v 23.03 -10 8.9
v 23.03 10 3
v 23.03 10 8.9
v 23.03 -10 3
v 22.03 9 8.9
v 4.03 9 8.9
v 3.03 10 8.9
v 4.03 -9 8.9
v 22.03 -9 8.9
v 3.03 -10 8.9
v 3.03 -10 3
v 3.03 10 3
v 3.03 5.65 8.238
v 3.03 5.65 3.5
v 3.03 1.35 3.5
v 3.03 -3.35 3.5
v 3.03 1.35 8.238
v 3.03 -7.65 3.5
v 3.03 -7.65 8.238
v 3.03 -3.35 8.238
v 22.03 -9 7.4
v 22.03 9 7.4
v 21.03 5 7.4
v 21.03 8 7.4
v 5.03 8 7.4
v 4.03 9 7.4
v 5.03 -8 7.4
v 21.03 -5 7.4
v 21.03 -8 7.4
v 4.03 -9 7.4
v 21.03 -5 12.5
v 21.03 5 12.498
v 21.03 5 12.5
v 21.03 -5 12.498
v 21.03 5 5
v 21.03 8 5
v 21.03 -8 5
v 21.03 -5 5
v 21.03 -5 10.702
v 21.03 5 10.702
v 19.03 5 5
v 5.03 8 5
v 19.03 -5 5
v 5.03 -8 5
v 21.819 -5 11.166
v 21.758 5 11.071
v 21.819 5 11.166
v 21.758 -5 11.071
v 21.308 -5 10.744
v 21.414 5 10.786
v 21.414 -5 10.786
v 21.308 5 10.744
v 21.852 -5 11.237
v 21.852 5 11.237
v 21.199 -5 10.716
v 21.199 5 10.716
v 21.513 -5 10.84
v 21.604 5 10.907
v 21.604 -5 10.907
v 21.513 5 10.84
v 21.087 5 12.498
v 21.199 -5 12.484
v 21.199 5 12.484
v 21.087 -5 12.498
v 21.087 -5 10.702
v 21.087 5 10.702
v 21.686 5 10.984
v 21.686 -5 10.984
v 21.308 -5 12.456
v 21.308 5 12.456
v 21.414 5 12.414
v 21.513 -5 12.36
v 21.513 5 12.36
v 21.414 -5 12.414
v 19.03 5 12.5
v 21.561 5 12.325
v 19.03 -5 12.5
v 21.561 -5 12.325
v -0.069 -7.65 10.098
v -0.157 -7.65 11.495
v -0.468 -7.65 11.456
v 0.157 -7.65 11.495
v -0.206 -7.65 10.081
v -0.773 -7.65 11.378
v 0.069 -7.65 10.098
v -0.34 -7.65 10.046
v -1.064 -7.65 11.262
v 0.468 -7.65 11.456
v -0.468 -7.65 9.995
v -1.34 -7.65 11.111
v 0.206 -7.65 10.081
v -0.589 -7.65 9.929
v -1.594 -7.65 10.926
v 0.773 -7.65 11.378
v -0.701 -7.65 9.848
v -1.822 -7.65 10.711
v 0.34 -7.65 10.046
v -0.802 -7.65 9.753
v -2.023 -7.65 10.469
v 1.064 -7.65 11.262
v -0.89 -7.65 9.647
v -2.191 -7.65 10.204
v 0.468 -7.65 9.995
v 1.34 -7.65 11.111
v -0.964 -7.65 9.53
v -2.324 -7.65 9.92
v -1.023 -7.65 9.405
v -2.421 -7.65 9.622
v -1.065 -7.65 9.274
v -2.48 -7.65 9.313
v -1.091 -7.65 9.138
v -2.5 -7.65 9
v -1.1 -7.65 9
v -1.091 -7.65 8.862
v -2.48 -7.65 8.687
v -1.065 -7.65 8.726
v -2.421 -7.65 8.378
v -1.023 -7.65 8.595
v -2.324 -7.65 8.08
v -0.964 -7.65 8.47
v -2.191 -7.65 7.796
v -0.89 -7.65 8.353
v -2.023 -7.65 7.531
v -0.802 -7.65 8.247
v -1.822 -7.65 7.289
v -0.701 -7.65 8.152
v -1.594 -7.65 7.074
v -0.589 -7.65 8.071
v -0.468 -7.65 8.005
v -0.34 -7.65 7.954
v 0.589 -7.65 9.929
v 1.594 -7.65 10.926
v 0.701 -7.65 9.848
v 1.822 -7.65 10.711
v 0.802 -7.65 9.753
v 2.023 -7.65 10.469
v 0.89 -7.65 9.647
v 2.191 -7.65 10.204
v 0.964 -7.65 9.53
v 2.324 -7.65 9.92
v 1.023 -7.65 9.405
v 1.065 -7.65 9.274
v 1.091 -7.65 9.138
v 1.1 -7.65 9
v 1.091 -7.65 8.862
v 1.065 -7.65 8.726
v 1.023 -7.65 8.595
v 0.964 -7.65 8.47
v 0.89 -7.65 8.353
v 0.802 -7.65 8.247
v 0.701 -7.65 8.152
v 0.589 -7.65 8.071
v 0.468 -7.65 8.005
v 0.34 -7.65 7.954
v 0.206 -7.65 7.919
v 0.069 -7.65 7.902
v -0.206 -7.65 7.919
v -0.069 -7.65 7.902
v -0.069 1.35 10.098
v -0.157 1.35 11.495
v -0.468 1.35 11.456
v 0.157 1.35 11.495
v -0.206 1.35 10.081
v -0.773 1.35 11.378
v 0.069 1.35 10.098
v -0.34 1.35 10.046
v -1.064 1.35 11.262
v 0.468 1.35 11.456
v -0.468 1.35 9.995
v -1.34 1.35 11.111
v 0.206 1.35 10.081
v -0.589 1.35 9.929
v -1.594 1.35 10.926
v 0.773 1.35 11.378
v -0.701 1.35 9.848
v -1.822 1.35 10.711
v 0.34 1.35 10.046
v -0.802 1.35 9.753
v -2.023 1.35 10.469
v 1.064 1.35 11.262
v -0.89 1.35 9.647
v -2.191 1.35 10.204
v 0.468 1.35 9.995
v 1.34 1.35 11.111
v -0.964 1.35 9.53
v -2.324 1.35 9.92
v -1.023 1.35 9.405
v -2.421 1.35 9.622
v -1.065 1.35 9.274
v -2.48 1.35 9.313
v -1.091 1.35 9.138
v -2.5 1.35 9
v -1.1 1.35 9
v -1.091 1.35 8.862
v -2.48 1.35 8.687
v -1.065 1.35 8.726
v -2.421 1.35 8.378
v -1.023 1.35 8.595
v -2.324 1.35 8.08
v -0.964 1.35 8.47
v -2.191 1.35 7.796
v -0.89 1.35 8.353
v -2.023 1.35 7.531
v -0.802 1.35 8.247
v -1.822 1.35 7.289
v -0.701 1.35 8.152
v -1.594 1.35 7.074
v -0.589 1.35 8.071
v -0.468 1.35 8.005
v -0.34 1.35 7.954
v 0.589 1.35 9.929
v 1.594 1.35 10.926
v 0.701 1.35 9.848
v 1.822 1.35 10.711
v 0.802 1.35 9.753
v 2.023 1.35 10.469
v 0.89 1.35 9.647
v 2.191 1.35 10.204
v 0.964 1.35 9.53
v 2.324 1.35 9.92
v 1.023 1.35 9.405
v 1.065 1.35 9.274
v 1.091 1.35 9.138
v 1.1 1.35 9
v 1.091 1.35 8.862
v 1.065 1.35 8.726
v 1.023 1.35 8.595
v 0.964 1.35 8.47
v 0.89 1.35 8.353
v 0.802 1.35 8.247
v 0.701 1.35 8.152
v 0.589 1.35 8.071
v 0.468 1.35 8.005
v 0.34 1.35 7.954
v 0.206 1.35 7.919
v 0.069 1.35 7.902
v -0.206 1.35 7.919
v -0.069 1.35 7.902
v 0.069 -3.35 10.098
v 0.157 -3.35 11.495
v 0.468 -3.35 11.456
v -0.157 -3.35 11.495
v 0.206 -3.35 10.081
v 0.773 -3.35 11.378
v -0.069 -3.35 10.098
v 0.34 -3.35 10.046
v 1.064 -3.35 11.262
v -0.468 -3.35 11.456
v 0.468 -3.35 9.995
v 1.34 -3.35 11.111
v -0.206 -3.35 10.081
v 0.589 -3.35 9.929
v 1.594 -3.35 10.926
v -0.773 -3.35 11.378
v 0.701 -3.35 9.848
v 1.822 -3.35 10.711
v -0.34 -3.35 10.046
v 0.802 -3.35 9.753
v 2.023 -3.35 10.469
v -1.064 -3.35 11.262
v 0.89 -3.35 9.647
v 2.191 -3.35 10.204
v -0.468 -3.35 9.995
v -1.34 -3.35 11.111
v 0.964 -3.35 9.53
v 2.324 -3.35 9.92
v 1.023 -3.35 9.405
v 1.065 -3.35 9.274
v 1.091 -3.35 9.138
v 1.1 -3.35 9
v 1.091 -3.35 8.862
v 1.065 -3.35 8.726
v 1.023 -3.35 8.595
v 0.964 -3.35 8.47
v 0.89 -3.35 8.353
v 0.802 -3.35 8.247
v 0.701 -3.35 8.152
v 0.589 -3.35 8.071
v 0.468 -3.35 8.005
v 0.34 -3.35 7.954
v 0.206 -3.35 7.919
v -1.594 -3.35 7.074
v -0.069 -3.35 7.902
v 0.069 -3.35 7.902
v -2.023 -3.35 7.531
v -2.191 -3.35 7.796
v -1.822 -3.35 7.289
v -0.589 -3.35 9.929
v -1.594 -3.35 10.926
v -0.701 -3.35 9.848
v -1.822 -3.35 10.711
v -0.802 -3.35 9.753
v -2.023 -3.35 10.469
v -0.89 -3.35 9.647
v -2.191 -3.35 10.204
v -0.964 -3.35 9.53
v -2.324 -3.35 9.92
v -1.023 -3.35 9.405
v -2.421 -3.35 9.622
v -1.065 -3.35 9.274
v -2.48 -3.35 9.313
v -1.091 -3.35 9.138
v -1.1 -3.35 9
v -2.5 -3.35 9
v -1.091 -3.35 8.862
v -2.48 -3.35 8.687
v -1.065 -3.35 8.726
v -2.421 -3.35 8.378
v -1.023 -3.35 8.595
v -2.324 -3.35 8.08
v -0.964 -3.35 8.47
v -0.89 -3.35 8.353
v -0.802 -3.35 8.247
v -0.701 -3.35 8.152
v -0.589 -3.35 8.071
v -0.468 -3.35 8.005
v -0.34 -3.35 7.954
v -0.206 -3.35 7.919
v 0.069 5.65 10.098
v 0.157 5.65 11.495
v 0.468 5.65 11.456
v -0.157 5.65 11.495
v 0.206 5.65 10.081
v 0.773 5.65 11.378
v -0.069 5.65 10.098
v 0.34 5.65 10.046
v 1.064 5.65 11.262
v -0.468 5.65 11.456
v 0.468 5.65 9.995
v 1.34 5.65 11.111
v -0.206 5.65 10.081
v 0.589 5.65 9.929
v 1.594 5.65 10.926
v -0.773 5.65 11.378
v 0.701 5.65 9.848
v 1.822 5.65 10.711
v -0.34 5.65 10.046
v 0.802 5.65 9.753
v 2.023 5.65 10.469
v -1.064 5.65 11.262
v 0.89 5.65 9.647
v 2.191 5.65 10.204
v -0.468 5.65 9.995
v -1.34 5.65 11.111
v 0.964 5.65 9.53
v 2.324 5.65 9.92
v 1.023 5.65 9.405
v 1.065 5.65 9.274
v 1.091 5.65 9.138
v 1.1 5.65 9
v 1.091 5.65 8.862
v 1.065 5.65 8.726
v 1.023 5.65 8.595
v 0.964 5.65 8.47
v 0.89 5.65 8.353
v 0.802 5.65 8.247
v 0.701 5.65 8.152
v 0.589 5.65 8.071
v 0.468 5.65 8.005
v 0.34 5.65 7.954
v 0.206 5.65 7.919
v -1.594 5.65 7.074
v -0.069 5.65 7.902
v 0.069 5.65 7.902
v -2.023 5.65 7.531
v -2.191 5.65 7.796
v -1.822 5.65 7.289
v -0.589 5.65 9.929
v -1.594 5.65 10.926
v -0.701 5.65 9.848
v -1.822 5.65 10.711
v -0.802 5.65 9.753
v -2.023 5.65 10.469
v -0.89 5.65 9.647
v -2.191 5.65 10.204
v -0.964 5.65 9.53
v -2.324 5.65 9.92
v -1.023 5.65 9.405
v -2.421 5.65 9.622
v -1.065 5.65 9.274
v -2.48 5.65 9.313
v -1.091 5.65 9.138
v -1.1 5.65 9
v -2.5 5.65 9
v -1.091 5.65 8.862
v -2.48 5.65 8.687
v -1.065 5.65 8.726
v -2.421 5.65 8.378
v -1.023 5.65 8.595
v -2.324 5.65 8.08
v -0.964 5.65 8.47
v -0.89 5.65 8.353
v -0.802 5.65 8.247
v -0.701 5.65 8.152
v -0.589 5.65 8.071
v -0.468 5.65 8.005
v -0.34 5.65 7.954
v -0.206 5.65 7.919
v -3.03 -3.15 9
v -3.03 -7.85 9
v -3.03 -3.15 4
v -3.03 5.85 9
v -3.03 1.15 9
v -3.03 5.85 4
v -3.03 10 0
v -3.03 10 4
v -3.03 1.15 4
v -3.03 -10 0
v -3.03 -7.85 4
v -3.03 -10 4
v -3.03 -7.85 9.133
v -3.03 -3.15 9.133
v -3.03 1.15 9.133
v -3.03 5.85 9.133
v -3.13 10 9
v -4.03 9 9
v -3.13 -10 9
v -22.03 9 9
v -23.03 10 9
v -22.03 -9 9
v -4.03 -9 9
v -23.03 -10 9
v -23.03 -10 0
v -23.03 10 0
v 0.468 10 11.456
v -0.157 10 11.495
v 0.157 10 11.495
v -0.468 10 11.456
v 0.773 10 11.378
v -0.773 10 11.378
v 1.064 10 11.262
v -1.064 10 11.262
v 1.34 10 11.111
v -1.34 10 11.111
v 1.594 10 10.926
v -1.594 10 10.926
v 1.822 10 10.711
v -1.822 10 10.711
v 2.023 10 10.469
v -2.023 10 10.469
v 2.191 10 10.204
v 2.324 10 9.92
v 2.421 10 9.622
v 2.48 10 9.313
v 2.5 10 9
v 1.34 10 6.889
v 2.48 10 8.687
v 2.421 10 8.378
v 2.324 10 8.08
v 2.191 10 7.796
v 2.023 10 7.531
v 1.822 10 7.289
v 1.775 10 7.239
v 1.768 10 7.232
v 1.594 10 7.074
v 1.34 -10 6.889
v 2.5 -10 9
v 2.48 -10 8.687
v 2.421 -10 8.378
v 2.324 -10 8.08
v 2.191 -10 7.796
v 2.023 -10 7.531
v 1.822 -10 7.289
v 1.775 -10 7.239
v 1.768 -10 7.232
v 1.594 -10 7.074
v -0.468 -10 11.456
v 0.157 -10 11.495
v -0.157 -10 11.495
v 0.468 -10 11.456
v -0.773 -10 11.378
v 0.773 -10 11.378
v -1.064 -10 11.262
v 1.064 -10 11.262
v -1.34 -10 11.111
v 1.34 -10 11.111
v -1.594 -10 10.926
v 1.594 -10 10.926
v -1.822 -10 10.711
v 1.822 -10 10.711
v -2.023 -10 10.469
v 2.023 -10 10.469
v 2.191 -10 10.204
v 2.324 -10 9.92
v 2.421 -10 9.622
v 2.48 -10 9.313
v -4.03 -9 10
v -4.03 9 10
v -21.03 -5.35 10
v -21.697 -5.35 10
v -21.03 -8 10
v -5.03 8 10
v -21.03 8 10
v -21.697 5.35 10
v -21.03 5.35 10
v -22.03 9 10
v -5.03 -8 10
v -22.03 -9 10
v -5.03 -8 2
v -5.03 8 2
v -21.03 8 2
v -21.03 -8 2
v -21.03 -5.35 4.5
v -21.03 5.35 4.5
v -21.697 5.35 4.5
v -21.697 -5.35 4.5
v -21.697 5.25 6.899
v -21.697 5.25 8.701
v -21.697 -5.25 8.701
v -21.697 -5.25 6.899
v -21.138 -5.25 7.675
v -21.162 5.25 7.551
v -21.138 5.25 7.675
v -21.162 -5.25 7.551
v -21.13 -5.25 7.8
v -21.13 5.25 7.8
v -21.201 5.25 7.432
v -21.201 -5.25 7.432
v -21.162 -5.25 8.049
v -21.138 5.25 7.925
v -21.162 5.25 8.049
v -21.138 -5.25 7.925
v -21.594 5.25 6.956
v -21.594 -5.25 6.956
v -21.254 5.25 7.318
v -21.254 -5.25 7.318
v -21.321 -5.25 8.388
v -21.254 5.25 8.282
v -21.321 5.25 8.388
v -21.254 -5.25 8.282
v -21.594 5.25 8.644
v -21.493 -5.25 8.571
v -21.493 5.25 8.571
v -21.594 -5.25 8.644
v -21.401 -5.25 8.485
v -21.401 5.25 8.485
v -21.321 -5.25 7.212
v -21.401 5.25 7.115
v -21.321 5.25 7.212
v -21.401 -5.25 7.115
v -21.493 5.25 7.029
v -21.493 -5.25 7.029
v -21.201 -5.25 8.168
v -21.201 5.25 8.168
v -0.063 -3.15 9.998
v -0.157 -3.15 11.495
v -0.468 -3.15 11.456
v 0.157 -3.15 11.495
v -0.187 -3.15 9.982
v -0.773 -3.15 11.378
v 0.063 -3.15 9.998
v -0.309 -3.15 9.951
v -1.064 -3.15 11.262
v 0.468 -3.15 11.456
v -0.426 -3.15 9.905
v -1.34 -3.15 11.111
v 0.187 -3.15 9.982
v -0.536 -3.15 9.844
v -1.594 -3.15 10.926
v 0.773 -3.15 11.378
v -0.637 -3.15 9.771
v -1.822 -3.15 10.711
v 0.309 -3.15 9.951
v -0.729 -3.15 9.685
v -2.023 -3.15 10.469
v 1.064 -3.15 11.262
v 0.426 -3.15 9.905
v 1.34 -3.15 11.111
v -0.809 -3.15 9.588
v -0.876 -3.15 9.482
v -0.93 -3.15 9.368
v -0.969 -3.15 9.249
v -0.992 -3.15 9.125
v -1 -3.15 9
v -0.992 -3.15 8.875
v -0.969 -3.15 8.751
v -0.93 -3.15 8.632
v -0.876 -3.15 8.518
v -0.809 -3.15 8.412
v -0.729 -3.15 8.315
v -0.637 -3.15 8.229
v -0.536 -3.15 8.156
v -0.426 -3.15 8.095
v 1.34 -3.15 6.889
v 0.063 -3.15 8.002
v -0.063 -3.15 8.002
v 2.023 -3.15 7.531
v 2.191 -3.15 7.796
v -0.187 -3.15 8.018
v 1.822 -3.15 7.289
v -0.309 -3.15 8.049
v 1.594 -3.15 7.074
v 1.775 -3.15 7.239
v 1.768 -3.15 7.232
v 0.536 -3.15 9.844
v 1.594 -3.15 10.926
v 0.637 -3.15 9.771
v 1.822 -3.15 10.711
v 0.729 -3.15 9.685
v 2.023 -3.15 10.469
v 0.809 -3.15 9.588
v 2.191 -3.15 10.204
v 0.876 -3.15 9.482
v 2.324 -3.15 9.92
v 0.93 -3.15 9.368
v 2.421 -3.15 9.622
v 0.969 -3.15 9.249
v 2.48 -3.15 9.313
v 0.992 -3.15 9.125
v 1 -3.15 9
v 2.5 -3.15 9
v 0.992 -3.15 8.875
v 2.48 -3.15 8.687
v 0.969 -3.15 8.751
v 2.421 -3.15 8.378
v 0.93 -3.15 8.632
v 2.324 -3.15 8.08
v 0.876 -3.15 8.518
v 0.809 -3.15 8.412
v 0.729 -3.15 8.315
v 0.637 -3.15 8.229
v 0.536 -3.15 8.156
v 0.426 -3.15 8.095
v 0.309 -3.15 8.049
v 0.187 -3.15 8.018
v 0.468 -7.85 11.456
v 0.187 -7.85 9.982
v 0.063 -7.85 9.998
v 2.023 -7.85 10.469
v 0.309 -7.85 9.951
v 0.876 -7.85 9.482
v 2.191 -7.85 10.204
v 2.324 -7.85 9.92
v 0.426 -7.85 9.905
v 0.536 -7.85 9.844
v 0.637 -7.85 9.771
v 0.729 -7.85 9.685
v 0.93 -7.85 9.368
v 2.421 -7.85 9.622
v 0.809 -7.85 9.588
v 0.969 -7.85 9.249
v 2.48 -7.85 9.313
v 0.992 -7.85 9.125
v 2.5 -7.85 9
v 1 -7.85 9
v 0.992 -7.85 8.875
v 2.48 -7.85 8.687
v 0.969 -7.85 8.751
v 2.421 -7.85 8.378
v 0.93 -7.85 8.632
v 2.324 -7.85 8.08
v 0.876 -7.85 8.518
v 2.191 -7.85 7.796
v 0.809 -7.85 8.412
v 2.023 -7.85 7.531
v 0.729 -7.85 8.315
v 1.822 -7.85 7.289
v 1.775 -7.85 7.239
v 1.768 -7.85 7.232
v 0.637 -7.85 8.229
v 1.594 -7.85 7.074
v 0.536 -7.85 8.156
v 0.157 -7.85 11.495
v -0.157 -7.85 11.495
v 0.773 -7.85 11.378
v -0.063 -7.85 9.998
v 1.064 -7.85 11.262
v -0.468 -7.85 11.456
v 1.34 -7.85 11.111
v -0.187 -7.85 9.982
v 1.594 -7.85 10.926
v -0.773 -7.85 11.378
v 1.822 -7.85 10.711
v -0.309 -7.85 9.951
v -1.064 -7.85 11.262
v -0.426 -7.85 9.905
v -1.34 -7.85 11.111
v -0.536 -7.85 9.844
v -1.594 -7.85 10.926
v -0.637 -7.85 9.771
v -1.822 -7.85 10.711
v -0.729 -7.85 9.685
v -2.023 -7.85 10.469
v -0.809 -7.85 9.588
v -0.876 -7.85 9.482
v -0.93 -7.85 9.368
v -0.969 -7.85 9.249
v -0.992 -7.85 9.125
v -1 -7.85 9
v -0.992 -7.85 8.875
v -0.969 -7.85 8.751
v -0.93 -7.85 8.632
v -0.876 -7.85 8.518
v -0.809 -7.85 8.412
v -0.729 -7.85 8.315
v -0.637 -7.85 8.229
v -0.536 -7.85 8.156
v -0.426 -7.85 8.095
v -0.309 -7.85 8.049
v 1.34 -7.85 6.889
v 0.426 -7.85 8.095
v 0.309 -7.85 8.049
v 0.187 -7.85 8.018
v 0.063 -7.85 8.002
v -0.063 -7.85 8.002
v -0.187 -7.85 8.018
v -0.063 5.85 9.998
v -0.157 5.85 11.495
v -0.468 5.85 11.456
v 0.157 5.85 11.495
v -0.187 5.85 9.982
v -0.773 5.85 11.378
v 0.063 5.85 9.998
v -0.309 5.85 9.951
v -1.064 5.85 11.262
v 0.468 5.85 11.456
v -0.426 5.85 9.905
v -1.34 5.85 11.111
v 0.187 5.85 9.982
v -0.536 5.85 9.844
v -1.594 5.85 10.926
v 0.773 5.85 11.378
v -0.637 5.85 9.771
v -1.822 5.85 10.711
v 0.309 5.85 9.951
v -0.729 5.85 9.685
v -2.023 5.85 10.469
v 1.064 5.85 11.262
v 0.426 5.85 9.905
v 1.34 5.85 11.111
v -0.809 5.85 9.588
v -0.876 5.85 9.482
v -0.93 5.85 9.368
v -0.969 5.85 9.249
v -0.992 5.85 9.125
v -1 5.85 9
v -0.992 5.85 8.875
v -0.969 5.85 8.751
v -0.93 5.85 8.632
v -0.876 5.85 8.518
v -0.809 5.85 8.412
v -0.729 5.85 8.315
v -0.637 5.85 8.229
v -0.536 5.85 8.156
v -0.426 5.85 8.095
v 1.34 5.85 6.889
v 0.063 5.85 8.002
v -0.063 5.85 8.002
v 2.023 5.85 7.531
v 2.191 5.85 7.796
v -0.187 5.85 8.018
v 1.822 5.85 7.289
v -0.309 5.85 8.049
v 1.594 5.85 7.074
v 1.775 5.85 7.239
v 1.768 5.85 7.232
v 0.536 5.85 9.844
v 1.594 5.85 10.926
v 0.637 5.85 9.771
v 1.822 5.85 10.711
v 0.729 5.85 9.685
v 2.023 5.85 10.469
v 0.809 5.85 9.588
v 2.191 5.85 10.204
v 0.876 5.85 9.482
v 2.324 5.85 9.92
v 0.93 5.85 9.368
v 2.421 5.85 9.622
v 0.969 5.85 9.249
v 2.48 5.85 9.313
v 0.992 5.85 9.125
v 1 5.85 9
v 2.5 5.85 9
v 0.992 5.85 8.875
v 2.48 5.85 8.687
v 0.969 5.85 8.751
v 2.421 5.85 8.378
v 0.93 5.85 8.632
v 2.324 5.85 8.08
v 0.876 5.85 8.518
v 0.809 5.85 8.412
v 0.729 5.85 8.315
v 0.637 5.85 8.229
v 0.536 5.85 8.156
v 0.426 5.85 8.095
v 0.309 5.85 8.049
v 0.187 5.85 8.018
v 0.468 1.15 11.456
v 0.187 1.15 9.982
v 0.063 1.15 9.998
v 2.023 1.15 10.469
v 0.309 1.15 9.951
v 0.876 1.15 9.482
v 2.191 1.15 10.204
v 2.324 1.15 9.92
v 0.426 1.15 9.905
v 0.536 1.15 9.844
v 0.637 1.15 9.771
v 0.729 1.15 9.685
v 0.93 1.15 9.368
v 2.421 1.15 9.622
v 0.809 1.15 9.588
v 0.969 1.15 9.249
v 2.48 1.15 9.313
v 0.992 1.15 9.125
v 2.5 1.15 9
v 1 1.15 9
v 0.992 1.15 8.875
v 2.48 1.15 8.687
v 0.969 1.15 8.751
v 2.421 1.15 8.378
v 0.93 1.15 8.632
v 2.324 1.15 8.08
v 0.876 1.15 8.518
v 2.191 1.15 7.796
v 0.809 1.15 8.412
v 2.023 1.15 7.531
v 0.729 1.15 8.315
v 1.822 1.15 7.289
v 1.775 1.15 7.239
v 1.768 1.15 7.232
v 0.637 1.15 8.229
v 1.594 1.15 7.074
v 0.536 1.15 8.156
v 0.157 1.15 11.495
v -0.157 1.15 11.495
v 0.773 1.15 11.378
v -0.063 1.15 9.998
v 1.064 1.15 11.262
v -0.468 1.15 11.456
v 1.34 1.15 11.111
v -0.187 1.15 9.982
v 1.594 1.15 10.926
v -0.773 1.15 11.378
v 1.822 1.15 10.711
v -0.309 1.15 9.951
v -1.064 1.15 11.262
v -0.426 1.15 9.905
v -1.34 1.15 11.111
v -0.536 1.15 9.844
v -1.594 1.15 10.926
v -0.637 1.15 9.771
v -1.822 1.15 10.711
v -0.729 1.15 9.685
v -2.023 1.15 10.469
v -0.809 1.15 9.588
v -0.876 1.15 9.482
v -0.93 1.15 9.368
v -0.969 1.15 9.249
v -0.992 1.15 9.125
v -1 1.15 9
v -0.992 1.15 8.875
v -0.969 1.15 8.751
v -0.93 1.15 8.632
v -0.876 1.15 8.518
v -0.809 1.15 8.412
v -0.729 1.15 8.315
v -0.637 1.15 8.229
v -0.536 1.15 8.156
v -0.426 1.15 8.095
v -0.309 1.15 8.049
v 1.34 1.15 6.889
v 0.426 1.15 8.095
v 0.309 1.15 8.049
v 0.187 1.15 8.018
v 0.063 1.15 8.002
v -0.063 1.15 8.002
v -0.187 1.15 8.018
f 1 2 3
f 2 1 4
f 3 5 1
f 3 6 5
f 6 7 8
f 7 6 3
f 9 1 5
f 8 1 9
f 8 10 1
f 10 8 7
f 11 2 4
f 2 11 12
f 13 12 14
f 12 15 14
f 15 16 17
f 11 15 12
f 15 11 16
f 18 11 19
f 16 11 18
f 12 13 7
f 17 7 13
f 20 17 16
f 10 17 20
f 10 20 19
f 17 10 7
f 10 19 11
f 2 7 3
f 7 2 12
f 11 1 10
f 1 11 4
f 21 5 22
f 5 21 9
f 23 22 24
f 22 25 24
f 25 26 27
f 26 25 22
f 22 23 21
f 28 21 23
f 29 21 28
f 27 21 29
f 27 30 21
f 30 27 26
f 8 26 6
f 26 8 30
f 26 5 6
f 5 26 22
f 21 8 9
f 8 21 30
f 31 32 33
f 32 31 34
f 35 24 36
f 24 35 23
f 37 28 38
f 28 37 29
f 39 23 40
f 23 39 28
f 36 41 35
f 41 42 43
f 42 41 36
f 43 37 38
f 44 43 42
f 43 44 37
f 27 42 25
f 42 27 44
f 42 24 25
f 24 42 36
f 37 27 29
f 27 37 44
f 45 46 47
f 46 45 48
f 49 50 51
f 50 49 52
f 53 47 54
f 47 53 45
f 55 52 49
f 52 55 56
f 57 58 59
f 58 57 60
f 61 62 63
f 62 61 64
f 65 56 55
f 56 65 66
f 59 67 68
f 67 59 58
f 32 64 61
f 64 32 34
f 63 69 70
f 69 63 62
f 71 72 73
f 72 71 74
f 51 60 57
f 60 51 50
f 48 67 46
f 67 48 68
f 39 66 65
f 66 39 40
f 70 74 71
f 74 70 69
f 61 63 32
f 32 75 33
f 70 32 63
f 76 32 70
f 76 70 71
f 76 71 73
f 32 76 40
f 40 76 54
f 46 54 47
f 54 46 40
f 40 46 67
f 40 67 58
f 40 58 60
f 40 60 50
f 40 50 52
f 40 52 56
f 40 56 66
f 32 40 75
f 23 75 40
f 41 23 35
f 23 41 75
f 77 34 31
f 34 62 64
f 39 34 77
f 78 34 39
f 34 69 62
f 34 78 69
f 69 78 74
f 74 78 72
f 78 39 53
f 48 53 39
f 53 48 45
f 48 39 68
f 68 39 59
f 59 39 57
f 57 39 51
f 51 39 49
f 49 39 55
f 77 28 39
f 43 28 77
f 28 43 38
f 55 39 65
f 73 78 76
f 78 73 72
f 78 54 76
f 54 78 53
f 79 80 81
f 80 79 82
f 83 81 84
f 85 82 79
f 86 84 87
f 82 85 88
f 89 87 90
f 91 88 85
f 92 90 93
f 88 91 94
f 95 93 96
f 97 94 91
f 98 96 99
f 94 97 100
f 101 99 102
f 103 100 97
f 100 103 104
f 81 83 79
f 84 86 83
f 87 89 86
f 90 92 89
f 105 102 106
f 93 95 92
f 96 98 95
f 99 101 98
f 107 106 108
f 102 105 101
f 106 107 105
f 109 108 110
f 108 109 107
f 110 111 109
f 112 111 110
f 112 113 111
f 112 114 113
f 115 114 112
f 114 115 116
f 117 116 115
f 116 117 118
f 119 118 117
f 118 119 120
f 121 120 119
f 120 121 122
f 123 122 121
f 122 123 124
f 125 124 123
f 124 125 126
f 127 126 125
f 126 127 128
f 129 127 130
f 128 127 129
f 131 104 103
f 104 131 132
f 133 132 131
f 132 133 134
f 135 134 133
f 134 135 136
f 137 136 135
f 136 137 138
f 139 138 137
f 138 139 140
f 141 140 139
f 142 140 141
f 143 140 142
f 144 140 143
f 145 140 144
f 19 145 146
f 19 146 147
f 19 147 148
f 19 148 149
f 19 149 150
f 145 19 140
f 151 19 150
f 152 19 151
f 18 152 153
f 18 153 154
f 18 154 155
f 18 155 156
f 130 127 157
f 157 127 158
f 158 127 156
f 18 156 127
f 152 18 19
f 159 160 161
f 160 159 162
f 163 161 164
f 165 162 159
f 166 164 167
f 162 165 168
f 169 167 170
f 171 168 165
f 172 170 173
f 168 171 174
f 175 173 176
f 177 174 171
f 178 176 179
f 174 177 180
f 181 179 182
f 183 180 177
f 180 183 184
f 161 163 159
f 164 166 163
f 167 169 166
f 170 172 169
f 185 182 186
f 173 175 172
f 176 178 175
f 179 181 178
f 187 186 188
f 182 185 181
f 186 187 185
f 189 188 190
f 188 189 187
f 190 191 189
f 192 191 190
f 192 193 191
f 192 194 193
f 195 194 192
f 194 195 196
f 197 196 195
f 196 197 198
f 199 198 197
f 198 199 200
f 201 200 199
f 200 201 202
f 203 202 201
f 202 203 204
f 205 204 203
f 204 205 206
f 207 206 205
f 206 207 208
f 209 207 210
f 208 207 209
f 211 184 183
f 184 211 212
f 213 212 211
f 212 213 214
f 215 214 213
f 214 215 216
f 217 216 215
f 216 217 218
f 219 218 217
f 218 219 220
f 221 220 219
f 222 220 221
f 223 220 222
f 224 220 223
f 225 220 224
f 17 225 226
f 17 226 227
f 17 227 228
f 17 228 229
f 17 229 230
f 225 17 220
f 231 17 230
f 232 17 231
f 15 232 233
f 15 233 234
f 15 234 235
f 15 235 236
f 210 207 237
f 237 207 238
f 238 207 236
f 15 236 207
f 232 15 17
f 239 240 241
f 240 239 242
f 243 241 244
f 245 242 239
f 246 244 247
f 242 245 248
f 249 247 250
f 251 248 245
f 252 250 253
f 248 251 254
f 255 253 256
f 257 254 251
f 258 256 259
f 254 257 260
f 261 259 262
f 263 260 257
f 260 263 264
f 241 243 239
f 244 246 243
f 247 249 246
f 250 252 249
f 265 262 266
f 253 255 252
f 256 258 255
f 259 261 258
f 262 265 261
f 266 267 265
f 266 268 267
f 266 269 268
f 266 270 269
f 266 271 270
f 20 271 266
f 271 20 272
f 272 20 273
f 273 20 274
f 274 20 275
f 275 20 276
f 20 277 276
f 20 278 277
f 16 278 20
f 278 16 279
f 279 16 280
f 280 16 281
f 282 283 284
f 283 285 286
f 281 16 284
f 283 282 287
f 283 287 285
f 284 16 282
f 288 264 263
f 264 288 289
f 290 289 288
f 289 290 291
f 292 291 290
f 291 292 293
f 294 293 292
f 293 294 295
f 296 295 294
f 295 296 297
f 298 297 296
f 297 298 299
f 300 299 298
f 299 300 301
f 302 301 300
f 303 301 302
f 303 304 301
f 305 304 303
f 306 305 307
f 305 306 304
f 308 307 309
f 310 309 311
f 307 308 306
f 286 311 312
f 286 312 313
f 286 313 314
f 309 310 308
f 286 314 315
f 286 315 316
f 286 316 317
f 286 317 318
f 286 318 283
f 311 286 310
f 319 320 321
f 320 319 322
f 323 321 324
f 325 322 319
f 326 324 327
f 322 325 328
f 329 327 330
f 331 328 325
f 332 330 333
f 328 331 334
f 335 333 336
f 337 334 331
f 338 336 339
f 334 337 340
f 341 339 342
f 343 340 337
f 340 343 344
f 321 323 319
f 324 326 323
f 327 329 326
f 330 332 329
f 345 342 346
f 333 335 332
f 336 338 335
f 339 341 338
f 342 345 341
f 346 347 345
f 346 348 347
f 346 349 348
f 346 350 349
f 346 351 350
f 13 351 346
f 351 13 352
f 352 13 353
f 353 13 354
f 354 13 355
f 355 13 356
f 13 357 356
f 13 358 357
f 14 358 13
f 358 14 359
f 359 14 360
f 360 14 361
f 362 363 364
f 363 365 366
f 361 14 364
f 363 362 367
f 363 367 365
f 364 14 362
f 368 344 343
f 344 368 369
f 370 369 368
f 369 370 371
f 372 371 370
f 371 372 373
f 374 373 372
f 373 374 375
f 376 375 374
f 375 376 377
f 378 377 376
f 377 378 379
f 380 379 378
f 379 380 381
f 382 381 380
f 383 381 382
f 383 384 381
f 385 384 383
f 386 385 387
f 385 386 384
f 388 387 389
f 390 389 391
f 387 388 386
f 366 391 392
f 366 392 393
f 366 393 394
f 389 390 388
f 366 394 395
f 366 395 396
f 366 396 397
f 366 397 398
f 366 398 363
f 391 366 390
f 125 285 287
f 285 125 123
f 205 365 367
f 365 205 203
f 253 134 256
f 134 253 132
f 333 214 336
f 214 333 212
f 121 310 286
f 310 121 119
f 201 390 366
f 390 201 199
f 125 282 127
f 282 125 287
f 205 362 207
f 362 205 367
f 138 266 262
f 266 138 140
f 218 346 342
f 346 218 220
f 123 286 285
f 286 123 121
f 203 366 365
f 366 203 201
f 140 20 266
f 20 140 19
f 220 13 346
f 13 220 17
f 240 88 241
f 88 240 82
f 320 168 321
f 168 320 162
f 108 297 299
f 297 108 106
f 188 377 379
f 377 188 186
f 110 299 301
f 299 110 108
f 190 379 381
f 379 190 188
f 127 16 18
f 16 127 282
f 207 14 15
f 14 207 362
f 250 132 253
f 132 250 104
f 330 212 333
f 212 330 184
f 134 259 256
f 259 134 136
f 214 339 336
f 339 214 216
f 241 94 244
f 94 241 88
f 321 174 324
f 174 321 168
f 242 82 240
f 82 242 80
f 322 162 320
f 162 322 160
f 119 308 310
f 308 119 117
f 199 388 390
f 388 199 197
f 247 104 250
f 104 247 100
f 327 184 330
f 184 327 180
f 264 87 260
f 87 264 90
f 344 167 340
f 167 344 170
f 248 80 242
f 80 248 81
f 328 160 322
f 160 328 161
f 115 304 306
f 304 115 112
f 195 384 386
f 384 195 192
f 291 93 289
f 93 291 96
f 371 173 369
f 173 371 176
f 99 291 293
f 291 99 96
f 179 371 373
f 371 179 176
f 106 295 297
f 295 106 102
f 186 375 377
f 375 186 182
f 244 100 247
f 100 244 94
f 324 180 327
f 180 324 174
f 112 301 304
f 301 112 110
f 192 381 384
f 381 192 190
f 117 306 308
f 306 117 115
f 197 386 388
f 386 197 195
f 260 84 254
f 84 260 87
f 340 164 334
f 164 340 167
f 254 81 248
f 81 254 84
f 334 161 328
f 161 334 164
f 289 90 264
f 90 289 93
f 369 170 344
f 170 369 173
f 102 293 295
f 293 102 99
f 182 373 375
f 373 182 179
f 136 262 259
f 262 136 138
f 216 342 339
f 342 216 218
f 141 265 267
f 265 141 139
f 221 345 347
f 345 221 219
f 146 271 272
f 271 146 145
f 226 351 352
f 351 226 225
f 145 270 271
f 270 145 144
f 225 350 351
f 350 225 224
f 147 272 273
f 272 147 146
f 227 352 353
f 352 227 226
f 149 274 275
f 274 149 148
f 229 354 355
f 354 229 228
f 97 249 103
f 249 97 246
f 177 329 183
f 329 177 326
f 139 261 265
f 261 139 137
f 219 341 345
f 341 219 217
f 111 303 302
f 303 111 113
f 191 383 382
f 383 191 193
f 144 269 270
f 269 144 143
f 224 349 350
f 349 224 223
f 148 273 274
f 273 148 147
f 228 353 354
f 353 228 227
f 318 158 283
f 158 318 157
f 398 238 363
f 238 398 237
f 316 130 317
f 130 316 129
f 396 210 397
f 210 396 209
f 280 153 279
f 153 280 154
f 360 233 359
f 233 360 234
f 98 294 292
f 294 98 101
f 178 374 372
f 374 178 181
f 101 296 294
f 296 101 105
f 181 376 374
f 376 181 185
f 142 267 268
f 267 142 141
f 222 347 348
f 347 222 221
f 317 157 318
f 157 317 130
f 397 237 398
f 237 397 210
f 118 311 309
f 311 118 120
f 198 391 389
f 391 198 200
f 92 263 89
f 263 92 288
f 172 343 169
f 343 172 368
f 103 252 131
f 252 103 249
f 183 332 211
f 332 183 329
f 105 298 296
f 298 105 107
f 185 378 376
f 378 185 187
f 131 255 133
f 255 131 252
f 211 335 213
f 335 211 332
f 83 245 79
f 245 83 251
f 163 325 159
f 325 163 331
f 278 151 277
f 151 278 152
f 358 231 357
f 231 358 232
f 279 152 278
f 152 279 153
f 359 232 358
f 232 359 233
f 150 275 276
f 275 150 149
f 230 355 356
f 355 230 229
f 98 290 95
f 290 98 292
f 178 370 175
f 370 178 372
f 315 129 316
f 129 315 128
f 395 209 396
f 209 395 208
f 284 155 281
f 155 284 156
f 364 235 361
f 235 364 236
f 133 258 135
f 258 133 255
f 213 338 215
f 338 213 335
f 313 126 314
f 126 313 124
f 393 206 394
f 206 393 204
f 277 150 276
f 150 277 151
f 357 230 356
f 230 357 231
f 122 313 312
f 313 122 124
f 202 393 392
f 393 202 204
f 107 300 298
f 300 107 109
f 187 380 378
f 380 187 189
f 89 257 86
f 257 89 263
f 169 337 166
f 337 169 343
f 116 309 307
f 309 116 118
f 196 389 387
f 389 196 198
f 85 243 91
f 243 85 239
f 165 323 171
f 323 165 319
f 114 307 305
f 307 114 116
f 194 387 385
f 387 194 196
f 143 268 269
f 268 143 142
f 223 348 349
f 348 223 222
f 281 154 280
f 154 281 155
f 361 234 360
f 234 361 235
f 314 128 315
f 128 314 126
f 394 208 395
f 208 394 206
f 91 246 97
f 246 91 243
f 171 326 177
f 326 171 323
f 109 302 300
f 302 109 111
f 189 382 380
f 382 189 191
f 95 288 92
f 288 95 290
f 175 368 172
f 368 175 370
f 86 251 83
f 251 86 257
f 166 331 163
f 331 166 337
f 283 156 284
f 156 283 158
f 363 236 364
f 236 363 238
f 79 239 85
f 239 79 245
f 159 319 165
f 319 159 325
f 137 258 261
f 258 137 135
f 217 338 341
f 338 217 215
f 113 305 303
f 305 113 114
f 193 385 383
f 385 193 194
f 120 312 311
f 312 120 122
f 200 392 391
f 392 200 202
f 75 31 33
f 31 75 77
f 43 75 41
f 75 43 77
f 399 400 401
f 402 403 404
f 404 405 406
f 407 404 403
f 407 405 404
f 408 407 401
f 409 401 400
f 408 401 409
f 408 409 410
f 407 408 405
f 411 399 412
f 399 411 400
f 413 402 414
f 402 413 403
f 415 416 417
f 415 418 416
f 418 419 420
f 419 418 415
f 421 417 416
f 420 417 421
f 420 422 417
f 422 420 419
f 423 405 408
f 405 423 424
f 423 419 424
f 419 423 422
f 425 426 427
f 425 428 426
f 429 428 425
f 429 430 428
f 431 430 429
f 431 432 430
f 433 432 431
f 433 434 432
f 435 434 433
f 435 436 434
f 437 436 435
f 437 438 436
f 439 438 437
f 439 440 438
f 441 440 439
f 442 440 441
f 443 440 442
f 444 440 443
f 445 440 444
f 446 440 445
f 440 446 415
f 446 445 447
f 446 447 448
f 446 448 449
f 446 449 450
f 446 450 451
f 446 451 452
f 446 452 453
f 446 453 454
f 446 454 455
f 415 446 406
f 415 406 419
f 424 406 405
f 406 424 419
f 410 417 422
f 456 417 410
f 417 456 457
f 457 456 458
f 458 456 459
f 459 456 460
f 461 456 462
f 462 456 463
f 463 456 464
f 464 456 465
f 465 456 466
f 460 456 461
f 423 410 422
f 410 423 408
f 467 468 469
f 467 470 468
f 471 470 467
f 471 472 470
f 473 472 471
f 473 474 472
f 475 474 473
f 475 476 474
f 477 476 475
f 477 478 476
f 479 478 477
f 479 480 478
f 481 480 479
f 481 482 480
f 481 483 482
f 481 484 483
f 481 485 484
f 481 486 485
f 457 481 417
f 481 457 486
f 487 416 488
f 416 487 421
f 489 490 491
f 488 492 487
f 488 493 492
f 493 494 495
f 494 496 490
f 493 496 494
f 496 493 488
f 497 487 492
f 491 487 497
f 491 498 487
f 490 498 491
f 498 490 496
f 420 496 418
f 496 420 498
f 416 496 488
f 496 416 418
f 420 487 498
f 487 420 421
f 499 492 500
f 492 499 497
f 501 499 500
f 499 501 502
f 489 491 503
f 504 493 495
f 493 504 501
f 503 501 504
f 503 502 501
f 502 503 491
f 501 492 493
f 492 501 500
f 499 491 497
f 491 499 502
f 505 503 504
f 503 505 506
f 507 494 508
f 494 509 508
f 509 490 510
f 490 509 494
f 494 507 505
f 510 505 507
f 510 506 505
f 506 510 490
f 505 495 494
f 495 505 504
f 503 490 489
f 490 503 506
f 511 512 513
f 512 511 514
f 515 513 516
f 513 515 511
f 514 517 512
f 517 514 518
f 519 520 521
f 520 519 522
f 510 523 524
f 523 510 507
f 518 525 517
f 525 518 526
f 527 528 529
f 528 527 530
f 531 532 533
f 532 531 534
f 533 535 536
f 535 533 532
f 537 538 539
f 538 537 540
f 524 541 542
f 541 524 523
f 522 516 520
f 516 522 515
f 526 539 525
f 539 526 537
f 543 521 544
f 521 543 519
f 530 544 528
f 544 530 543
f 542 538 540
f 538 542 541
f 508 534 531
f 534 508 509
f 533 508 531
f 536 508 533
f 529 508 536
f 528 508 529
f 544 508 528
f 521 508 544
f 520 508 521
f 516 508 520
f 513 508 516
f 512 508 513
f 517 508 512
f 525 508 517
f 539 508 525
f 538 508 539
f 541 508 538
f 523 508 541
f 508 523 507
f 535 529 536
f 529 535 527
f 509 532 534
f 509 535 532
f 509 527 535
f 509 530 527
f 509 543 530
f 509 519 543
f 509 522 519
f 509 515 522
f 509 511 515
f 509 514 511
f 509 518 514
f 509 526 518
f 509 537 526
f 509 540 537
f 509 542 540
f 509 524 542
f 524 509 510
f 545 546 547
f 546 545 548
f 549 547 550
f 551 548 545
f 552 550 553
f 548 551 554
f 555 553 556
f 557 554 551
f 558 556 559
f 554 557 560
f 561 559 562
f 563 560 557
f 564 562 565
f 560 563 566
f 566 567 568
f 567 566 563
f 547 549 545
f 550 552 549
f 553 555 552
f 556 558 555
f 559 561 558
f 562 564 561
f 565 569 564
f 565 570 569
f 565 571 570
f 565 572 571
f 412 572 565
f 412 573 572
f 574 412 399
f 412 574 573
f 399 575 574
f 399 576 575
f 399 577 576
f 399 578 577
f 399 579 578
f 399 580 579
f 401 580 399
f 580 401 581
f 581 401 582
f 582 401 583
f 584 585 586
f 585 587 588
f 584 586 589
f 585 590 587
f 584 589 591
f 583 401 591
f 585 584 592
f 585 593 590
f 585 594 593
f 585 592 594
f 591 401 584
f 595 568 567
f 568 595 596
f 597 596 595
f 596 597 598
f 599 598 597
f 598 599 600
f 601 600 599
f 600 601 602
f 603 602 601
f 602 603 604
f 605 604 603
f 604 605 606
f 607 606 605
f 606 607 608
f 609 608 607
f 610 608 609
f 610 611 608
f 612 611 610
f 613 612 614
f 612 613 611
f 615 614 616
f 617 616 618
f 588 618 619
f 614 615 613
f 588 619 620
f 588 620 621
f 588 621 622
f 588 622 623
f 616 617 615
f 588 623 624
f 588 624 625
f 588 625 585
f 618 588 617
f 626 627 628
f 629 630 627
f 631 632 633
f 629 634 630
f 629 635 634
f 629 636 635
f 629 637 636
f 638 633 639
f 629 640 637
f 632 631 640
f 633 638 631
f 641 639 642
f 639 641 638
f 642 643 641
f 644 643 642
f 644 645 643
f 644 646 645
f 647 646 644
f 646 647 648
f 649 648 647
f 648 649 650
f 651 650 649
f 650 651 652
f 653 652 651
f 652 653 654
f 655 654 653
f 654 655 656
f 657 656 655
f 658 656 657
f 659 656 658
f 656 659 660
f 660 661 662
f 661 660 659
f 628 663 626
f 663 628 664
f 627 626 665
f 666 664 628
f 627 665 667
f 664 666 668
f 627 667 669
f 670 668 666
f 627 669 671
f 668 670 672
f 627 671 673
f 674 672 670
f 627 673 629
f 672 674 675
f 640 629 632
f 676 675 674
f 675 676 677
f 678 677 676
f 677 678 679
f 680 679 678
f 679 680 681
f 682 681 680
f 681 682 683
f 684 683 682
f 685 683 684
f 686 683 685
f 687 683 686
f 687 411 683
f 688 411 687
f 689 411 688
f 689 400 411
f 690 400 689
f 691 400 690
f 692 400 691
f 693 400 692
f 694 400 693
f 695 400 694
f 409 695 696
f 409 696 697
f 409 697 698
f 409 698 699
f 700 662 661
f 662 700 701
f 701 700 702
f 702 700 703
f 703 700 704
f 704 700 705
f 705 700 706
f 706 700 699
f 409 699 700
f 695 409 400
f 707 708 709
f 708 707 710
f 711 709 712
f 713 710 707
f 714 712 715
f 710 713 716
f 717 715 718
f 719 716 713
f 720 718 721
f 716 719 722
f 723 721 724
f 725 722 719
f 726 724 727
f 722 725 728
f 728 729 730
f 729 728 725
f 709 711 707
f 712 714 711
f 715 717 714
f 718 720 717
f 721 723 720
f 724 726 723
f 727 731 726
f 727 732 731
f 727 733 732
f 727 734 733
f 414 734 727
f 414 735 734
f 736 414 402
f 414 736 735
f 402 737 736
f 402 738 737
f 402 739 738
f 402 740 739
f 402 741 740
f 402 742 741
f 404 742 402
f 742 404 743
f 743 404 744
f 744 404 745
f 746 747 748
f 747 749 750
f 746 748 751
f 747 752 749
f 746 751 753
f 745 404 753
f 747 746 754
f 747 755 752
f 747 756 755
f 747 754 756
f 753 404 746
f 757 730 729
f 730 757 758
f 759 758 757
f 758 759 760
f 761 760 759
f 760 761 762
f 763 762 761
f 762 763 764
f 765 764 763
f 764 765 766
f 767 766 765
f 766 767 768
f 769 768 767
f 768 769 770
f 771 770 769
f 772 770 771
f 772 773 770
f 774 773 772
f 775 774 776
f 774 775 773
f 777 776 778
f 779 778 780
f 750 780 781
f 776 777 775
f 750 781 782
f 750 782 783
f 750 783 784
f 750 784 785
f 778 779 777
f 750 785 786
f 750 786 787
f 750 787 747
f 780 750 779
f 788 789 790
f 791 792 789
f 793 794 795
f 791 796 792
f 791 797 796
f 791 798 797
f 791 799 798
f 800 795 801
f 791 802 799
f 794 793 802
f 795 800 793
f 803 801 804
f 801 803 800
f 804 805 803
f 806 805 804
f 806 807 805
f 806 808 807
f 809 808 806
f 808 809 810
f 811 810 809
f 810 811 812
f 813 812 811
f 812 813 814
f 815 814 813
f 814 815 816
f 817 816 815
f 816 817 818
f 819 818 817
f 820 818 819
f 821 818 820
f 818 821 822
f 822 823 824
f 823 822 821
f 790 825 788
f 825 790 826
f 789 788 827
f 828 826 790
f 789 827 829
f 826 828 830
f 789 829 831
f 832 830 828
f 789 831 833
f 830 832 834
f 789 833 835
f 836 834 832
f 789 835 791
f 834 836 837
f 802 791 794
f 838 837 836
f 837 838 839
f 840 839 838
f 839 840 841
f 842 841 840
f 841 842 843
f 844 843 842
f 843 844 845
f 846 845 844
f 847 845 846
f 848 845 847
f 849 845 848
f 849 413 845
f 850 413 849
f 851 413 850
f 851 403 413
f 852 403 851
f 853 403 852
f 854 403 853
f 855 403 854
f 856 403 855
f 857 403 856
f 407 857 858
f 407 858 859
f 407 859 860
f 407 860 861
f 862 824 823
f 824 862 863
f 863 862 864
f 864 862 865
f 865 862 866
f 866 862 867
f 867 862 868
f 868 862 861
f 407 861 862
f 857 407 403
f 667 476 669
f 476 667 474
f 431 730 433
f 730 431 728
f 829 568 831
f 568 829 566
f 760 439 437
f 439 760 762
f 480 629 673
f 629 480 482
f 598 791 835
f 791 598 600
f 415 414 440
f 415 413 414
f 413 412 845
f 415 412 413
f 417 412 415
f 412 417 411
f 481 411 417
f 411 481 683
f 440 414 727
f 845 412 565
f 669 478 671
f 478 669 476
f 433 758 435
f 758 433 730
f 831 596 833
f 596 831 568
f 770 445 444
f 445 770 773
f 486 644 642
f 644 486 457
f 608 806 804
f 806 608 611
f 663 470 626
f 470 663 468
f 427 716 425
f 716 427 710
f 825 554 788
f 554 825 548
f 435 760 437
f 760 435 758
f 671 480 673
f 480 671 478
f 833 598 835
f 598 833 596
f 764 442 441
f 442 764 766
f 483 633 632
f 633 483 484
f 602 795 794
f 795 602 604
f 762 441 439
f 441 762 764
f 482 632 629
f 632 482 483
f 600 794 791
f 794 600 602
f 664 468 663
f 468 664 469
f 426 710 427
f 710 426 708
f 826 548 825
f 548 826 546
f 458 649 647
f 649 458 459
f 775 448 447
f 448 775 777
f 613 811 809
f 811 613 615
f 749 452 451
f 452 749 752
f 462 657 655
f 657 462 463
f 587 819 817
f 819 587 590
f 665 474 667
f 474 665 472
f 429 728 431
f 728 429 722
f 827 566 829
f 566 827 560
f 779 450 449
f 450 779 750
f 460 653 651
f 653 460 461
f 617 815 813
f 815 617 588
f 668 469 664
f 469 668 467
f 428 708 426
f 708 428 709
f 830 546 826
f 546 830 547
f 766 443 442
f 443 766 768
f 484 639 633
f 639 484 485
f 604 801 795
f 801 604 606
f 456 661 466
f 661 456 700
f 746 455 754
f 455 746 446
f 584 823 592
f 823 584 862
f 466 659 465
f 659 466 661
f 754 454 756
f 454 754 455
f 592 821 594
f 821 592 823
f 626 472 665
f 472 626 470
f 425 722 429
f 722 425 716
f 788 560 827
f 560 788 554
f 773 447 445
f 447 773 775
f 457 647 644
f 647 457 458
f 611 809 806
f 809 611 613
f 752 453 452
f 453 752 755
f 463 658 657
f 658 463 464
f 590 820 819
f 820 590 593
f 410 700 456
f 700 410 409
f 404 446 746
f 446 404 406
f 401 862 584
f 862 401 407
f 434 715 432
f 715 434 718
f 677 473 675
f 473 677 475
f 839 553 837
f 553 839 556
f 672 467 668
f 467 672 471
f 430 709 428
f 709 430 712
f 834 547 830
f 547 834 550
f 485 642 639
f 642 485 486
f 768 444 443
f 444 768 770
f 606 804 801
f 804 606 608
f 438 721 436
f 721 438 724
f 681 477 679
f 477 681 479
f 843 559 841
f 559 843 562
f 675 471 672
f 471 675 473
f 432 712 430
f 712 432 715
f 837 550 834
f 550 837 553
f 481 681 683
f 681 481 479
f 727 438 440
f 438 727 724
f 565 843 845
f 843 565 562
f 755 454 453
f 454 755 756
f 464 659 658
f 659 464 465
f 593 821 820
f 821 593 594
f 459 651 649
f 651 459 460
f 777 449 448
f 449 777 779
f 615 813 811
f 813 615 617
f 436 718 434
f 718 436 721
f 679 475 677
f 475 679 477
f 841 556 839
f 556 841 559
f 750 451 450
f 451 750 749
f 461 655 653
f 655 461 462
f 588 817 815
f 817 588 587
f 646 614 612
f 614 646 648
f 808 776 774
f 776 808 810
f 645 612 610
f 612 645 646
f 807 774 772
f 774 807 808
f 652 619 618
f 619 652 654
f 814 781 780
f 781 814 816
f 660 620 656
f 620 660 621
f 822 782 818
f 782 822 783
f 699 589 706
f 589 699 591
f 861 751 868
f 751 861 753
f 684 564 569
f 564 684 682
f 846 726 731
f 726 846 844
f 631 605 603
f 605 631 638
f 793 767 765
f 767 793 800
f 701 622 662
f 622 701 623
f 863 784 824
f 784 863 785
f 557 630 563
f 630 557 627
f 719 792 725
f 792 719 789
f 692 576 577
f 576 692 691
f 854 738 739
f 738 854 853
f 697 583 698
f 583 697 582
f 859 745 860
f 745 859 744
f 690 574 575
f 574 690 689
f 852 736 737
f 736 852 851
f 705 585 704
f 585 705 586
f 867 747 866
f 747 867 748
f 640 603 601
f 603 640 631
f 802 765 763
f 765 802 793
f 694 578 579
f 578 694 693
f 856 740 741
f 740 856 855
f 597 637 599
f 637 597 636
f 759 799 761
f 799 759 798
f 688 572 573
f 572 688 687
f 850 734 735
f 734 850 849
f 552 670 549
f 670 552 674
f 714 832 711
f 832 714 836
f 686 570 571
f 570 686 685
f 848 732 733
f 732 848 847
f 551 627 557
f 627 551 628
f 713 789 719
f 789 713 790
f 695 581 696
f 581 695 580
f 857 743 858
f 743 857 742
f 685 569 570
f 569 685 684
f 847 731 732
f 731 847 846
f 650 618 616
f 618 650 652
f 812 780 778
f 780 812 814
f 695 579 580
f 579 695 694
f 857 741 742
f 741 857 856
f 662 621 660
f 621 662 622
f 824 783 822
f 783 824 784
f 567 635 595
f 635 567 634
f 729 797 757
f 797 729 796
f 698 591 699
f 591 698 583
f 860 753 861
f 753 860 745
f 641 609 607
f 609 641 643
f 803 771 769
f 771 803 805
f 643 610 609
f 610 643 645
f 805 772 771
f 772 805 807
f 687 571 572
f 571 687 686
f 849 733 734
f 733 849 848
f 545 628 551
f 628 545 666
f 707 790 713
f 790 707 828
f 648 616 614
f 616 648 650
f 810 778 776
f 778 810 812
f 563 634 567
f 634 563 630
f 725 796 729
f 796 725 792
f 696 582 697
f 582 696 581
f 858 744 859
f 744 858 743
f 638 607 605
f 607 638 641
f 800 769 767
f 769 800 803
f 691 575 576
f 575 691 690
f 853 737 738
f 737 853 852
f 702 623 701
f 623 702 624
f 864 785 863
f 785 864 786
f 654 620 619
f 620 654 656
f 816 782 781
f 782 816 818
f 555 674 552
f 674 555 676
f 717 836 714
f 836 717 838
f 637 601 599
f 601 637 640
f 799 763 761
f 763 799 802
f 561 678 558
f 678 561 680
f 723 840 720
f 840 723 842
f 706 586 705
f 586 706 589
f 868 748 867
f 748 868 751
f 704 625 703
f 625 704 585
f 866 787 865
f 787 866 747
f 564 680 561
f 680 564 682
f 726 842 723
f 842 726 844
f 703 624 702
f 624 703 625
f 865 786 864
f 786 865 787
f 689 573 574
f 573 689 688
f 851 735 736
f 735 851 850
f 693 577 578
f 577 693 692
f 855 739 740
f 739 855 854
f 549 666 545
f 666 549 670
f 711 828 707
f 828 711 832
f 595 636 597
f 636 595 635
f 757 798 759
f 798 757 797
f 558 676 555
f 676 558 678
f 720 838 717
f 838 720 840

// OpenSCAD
$fn = 50;
/* Examine carefully the layers before printing
 for the case some part is missing if measures 
 doesn't match. */

/* Basic parameters */
width = 20;
depth = 20;
topHeight = 6;
bottomHeight = 15-topHeight;
wallThickness = 2;

/* Fine parameters */
fingerSize = 4.5;

/* Finest parameters */
hingeOuter = 5; // Less than topHeight
hingeInner = 2; // Less or same as (hingeOuter - 3)
fingerLength = hingeOuter/1.65;
topFingerSize = fingerSize;

// Adjust for good printing. Pieces should be very close but not fused together.
hingeInnerSlop = .1;
hingeFingerSlop = .2;

latchWidth = 10;
latchThinkness = wallThickness;

innerBorderHeight=1;
innerBorderWitdh=wallThickness/2;

debugClosed=false;

if (debugClosed) {
   translate([0, 0, + (topHeight + bottomHeight)]) rotate([0,-180,0]) top();
} else {
   translate([0, 0, bottomHeight - topHeight]) top();
}
bottom();

module bottom() {
	union() {
		// main box and cutout
		difference() {
            union() {
                // Body
                translate([-width - fingerLength, -depth/2, 0]) {
                    cube([width,depth,bottomHeight]);
                }
                // Inner border
                translate([-width+innerBorderWitdh - fingerLength, -depth/2+innerBorderWitdh, bottomHeight]) {
                    cube([width-innerBorderWitdh*2,depth-innerBorderWitdh*2,innerBorderHeight]);
                }
            }
    
			translate([(-width - fingerLength) + wallThickness, -depth/2 + wallThickness, wallThickness]) {
				cube([width - (wallThickness * 2), depth - (wallThickness * 2), bottomHeight]);
			}

			// latch cutout
			translate([-width - fingerLength + (wallThickness*2/3), (-latchWidth/2) - (hingeFingerSlop/2) - .25, bottomHeight-4.5]) {
				cube([wallThickness/2 + .1, latchWidth + hingeFingerSlop + .5, bottomHeight]);
			}

						
		}

		//latch cylinder
		difference() {
			translate([-width - fingerLength + (wallThickness/2) - 0.1, -latchWidth/2 - .25, bottomHeight - 1 - 0.2]) {
				rotate([-90,0,0]) {
					cylinder(r = 1, h = latchWidth + .5);
				}
			}
			// front wall wipe
			translate([-width - fingerLength - 5, -depth/2,0]) {
				cube([5,depth,bottomHeight]);
			}
		}

		difference() {
			hull() {
				translate([0,-depth/2,bottomHeight]) {
					rotate([-90,0,0]) {
						cylinder(r = hingeOuter/2, h = depth);
					}
				}
				translate([-fingerLength - .1, -depth/2,bottomHeight - hingeOuter]){
					cube([.1,depth,hingeOuter]);
				}
				translate([-fingerLength, -depth/2,bottomHeight-.1]){
					cube([fingerLength,depth,.1]);
				}
				translate([0, -depth/2,bottomHeight]){
					rotate([0,45,0]) {
						cube([hingeOuter/2,depth,.01]);
					}
				}
			}
			// finger cutouts

			for  (i = [-depth/2 + fingerSize:fingerSize*2:depth/2]) {
				translate([-fingerLength,i - (fingerSize/2) - (hingeFingerSlop/2),0]) {
					cube([fingerLength*2,fingerSize + hingeFingerSlop,bottomHeight*2]);
				}
			}
		}

		// center rod
		translate([0, -depth/2, bottomHeight]) {
			rotate([-90,0,0]) {
				cylinder(r = hingeInner /2, h = depth);
			}
		}
	}
}

module top() {
    union() {
		difference() {
			// Body
            translate([fingerLength, -depth/2, 0]) {
				cube([width,depth,topHeight - .1]);
			}
            // Inner border
            translate([fingerLength+innerBorderWitdh, -depth/2+innerBorderWitdh, topHeight - innerBorderHeight - 0.6]) {
                cube([width-innerBorderWitdh*2,depth-innerBorderWitdh*2,innerBorderHeight + 1]);
            }
			translate([fingerLength + wallThickness, -depth/2 + wallThickness, wallThickness]) {
				cube([width - (wallThickness * 2), depth - (wallThickness * 2), topHeight]);
			}

			
		}

		//latch
		translate([width + fingerLength - wallThickness - latchThinkness, (-latchWidth/2), 0]) {
			cube([latchThinkness, latchWidth, topHeight - .5 + 4]);
		}
		translate([width + fingerLength - wallThickness, -latchWidth/2, topHeight - .5 + 3 + 0.1]) {
            intersection() {
                rotate([-90,0,0]) {
                    cylinder(r = 1 - 0.1, h = latchWidth);
                }
                rotate([0, -15, 0]) translate ([-1.3, 0, -1]) cube([2,latchWidth,2]);
            }
		}

		difference() {
			hull() {
				translate([0,-depth/2,topHeight]) {
                    rotate([-90,0,0]) {
                        cylinder(r = hingeOuter/2, h = depth);
                    }
				}
				translate([fingerLength, -depth/2,topHeight - hingeOuter - .5]){
					cube([.1,depth,hingeOuter - .5]);
				}
				translate([-fingerLength/2, -depth/2,topHeight-.1]){
					cube([fingerLength,depth,.1]);
				}
				translate([0, -depth/2,topHeight]){
					rotate([0,45,0]) {
						cube([hingeOuter/2,depth,.01]);
					}
				}
			}
			// finger cutouts
			for  (i = [-depth/2:fingerSize*2:depth/2 + fingerSize]) {
				translate([-fingerLength,i - (fingerSize/2) - (hingeFingerSlop/2),0]) {
					cube([fingerLength*2,fingerSize + hingeFingerSlop,topHeight*2]);
				}
				if (depth/2 - i < (fingerSize * 1.5)) {
					translate([-fingerLength,i - (fingerSize/2) - (hingeFingerSlop/2),0]) {
						cube([fingerLength*2,depth,topHeight*2]);
					}
				}
			}

			// center cutout
			translate([0, -depth/2, topHeight]) {
				rotate([-90,0,0]) {
					cylinder(r = hingeInner /2 + hingeInnerSlop, h = depth);
				}
			}
		}
	}
}
